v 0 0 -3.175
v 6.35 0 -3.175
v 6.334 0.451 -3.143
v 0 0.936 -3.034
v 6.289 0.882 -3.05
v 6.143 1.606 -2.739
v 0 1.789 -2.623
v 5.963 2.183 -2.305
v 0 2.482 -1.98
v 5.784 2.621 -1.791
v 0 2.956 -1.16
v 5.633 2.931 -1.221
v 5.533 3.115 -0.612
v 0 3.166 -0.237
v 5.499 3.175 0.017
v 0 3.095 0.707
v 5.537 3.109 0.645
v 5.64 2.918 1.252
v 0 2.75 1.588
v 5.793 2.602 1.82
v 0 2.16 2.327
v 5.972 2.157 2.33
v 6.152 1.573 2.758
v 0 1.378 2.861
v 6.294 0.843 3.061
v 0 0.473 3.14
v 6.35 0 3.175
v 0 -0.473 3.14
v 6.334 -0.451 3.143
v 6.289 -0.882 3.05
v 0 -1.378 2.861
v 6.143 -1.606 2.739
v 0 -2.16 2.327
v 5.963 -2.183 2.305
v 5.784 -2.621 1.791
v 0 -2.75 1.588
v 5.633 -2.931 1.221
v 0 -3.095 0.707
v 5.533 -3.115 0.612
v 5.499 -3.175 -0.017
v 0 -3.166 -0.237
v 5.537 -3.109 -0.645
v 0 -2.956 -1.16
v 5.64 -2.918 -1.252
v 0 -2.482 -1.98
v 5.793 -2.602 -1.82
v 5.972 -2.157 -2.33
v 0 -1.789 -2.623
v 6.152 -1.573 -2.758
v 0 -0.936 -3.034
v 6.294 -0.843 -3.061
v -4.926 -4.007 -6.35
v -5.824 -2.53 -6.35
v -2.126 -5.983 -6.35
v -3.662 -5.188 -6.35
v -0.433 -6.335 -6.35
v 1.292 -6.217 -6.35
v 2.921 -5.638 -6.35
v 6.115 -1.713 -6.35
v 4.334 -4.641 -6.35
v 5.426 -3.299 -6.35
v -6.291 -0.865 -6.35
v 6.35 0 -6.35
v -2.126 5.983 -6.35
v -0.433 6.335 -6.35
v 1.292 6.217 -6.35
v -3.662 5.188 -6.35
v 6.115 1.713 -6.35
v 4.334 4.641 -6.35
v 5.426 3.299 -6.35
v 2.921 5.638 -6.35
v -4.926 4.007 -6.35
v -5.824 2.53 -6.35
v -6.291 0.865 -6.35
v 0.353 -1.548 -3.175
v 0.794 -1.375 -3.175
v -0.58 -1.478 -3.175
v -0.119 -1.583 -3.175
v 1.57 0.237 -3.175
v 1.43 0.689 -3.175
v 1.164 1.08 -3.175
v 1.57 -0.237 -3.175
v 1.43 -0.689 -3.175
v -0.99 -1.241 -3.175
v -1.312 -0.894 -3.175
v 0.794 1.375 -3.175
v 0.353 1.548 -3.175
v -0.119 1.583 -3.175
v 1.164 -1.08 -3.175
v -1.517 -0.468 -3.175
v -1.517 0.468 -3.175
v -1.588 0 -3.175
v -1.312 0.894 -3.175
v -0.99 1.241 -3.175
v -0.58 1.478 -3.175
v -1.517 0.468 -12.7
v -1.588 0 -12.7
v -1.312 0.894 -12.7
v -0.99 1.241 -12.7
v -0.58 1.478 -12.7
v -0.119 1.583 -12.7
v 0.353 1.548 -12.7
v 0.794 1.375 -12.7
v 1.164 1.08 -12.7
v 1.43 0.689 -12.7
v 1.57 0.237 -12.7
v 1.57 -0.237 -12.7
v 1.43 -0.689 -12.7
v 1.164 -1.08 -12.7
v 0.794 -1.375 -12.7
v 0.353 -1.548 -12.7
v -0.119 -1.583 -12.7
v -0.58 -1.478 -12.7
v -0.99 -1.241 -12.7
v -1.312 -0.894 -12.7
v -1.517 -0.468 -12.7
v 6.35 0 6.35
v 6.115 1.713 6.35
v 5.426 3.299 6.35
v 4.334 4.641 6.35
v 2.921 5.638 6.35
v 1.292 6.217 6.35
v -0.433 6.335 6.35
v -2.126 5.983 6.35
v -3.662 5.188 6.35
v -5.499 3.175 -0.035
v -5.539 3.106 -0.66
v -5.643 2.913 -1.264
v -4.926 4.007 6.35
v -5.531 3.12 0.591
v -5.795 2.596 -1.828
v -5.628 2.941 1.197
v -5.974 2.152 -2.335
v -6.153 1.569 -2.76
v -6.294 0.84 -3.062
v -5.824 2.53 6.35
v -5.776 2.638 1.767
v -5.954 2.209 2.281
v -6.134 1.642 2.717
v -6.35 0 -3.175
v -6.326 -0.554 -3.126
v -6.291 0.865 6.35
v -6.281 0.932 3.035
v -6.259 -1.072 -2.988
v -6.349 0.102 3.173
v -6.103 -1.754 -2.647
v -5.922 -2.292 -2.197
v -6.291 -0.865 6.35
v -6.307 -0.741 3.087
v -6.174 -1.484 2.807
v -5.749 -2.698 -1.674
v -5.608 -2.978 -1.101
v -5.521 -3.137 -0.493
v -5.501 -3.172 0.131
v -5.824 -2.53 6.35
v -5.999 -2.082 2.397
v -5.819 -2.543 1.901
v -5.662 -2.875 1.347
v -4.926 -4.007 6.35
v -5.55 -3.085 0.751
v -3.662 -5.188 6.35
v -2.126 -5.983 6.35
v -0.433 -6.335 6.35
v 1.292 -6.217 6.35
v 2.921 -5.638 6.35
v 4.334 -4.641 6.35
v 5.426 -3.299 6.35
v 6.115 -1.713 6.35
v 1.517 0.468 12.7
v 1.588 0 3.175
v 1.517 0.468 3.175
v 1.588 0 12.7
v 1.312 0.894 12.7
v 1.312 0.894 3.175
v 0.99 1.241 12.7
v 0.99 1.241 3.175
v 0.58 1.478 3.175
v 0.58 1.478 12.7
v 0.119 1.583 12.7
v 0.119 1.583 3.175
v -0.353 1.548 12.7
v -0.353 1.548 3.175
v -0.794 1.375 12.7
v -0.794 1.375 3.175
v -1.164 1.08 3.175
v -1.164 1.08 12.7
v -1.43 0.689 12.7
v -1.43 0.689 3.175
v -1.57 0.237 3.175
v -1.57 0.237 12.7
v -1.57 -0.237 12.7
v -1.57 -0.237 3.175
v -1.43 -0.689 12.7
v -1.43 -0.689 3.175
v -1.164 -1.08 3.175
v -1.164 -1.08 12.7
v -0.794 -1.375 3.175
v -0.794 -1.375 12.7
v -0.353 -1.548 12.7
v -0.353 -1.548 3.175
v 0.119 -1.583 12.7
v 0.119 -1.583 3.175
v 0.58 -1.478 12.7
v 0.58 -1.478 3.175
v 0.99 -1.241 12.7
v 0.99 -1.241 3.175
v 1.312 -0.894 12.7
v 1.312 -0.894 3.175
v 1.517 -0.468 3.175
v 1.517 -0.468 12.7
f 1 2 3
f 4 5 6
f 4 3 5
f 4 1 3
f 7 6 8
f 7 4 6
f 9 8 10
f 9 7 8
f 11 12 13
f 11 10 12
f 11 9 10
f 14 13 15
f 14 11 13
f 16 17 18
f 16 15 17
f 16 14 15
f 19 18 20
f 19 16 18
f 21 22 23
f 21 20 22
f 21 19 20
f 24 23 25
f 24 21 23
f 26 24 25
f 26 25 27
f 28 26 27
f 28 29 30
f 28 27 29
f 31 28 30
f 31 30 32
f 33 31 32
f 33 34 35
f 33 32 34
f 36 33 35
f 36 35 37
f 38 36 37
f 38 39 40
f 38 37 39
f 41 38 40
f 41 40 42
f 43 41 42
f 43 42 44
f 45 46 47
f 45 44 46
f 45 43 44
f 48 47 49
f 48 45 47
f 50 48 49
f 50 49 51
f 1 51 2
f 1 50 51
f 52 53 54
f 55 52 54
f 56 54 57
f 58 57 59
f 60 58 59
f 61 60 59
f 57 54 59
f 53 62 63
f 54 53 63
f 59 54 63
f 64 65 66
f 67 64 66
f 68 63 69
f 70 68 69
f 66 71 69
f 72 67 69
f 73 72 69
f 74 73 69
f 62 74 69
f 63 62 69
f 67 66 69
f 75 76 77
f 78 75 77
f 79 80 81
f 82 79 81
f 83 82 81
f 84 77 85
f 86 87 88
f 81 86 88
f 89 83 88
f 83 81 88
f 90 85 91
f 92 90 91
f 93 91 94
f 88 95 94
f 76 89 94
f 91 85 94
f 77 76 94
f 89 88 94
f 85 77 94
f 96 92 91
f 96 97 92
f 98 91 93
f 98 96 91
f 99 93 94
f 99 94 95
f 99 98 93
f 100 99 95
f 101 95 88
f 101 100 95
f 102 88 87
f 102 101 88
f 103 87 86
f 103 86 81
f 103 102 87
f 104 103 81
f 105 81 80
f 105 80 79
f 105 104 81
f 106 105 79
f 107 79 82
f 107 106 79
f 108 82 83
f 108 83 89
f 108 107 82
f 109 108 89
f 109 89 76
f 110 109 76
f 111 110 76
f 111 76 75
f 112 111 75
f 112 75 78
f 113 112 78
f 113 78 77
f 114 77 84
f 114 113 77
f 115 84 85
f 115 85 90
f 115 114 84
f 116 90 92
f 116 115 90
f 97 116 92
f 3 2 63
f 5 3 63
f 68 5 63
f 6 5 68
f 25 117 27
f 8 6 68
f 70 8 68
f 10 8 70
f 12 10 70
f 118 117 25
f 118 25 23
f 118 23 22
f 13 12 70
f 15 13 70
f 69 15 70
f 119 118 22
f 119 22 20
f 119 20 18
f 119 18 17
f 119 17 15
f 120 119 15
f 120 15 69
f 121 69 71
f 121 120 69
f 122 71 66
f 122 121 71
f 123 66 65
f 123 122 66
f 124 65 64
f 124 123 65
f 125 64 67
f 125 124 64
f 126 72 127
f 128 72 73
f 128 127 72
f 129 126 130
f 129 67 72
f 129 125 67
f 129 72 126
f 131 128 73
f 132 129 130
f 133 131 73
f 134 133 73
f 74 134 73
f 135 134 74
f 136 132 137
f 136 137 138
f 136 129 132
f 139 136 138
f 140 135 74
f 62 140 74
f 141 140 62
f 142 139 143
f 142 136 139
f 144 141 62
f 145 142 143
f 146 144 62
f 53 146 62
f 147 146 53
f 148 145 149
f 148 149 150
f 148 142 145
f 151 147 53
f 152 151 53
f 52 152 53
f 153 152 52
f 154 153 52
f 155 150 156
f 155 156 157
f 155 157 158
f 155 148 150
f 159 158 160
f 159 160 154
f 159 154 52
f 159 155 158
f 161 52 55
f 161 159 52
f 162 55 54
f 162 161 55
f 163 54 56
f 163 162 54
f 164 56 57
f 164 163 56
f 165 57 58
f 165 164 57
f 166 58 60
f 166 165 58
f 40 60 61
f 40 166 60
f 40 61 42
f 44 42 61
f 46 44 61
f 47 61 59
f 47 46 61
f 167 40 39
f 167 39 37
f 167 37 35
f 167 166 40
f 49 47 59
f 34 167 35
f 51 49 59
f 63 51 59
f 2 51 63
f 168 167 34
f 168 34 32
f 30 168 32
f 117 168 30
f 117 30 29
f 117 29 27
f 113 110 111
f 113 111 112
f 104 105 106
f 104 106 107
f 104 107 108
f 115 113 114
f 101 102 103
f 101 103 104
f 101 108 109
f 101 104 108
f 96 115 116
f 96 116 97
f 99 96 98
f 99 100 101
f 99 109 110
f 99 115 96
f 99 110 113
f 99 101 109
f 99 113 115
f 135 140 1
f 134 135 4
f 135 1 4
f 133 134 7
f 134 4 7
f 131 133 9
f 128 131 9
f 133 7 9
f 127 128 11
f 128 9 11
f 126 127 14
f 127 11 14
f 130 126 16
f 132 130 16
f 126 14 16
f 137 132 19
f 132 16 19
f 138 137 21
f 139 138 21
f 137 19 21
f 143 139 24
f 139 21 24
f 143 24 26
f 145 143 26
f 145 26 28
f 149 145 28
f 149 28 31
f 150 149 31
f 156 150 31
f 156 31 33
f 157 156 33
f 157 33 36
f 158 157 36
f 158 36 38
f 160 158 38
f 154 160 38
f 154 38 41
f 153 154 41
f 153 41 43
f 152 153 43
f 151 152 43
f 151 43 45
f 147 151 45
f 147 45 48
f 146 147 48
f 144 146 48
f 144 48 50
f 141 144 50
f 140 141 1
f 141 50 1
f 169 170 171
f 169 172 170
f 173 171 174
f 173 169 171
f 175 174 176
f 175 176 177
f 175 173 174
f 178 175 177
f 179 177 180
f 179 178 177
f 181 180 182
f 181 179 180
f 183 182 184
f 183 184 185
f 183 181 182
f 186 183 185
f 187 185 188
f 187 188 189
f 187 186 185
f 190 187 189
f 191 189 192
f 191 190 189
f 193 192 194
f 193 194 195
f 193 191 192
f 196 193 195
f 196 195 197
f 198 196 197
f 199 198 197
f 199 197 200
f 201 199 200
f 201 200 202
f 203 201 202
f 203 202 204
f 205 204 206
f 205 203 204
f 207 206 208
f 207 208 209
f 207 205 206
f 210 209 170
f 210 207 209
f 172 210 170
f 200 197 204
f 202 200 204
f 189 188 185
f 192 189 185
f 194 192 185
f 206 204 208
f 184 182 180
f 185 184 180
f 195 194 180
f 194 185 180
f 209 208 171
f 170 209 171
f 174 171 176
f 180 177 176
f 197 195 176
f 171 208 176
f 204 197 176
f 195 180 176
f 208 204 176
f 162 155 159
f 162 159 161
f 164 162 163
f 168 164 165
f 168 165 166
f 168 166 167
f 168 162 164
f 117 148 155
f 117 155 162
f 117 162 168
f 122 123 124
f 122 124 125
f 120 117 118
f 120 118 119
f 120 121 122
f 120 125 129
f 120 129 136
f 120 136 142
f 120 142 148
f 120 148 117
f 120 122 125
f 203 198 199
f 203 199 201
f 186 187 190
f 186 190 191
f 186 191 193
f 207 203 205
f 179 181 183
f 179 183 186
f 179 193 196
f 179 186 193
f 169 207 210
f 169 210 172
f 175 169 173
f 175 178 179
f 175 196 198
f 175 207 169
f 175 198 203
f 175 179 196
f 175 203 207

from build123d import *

# Parameters (mm, degrees)
SKETCH1_R                      = 6.35
EXTRUDE1_DEPTH                 = 6.35
EXTRUDE1_DEPTH_BACK            = 6.35
CUT_EXTRUDE1_REACH             = 8.35
SKETCH2_R                      = 3.175
CUT_EXTRUDE1_DIRECTION_2_REACH = 8.35
SKETCH3_R                      = 1.5875
EXTRUDE2_DEPTH                 = 6.35
EXTRUDE2_DEPTH_BACK            = 3.175
SKETCH4_R                      = 1.5875
EXTRUDE3_DEPTH                 = 6.35
EXTRUDE3_DEPTH_BACK            = 3.175


with BuildPart() as part:
    # Sketch1 → Extrude1 (new body, two sides)
    with BuildSketch(Plane.XY) as extrude1_sk:
        Circle(SKETCH1_R)
    extrude(amount=EXTRUDE1_DEPTH)
    extrude(extrude1_sk.sketch, amount=-EXTRUDE1_DEPTH_BACK)

    # Sketch2 → Cut-Extrude1 (cut, up to next)
    with BuildSketch(Plane(origin=(0, 0, 0), x_dir=(0, 0, -1), z_dir=(1, 0, 0)), mode=Mode.PRIVATE) as cut_extrude1_sk1:
        Circle(SKETCH2_R)
    cut_extrude1_tool1 = extrude(cut_extrude1_sk1.sketch, amount=-CUT_EXTRUDE1_REACH, mode=Mode.PRIVATE) & part.part
    add(cut_extrude1_tool1.solids().sort_by_distance((0, 0, 0))[0], mode=Mode.SUBTRACT)

    # Sketch2 → Cut-Extrude1 direction 2 (cut, up to next)
    with BuildSketch(Plane(origin=(0, 0, 0), x_dir=(0, 0, -1), z_dir=(1, 0, 0)), mode=Mode.PRIVATE) as cut_extrude1_direction_2_sk1:
        Circle(SKETCH2_R)
    cut_extrude1_direction_2_tool1 = extrude(cut_extrude1_direction_2_sk1.sketch, amount=CUT_EXTRUDE1_DIRECTION_2_REACH, mode=Mode.PRIVATE) & part.part
    add(cut_extrude1_direction_2_tool1.solids().sort_by_distance((0, 0, 0))[0], mode=Mode.SUBTRACT)


with BuildPart() as body_2:
    # Sketch3 → Extrude2 (new body, two sides)
    with BuildSketch(Plane.XY.offset(6.35)) as extrude2_sk:
        Circle(SKETCH3_R)
    extrude(amount=EXTRUDE2_DEPTH)
    extrude(extrude2_sk.sketch, amount=-EXTRUDE2_DEPTH_BACK)


with BuildPart() as body_3:
    # Sketch4 → Extrude3 (new body, two sides)
    with BuildSketch(Plane(origin=(0, 0, -6.35), x_dir=(-1, 0, 0), z_dir=(0, 0, -1))) as extrude3_sk:
        Circle(SKETCH4_R)
    extrude(amount=EXTRUDE3_DEPTH)
    extrude(extrude3_sk.sketch, amount=-EXTRUDE3_DEPTH_BACK)


solid = Compound([part.part, body_2.part, body_3.part])
